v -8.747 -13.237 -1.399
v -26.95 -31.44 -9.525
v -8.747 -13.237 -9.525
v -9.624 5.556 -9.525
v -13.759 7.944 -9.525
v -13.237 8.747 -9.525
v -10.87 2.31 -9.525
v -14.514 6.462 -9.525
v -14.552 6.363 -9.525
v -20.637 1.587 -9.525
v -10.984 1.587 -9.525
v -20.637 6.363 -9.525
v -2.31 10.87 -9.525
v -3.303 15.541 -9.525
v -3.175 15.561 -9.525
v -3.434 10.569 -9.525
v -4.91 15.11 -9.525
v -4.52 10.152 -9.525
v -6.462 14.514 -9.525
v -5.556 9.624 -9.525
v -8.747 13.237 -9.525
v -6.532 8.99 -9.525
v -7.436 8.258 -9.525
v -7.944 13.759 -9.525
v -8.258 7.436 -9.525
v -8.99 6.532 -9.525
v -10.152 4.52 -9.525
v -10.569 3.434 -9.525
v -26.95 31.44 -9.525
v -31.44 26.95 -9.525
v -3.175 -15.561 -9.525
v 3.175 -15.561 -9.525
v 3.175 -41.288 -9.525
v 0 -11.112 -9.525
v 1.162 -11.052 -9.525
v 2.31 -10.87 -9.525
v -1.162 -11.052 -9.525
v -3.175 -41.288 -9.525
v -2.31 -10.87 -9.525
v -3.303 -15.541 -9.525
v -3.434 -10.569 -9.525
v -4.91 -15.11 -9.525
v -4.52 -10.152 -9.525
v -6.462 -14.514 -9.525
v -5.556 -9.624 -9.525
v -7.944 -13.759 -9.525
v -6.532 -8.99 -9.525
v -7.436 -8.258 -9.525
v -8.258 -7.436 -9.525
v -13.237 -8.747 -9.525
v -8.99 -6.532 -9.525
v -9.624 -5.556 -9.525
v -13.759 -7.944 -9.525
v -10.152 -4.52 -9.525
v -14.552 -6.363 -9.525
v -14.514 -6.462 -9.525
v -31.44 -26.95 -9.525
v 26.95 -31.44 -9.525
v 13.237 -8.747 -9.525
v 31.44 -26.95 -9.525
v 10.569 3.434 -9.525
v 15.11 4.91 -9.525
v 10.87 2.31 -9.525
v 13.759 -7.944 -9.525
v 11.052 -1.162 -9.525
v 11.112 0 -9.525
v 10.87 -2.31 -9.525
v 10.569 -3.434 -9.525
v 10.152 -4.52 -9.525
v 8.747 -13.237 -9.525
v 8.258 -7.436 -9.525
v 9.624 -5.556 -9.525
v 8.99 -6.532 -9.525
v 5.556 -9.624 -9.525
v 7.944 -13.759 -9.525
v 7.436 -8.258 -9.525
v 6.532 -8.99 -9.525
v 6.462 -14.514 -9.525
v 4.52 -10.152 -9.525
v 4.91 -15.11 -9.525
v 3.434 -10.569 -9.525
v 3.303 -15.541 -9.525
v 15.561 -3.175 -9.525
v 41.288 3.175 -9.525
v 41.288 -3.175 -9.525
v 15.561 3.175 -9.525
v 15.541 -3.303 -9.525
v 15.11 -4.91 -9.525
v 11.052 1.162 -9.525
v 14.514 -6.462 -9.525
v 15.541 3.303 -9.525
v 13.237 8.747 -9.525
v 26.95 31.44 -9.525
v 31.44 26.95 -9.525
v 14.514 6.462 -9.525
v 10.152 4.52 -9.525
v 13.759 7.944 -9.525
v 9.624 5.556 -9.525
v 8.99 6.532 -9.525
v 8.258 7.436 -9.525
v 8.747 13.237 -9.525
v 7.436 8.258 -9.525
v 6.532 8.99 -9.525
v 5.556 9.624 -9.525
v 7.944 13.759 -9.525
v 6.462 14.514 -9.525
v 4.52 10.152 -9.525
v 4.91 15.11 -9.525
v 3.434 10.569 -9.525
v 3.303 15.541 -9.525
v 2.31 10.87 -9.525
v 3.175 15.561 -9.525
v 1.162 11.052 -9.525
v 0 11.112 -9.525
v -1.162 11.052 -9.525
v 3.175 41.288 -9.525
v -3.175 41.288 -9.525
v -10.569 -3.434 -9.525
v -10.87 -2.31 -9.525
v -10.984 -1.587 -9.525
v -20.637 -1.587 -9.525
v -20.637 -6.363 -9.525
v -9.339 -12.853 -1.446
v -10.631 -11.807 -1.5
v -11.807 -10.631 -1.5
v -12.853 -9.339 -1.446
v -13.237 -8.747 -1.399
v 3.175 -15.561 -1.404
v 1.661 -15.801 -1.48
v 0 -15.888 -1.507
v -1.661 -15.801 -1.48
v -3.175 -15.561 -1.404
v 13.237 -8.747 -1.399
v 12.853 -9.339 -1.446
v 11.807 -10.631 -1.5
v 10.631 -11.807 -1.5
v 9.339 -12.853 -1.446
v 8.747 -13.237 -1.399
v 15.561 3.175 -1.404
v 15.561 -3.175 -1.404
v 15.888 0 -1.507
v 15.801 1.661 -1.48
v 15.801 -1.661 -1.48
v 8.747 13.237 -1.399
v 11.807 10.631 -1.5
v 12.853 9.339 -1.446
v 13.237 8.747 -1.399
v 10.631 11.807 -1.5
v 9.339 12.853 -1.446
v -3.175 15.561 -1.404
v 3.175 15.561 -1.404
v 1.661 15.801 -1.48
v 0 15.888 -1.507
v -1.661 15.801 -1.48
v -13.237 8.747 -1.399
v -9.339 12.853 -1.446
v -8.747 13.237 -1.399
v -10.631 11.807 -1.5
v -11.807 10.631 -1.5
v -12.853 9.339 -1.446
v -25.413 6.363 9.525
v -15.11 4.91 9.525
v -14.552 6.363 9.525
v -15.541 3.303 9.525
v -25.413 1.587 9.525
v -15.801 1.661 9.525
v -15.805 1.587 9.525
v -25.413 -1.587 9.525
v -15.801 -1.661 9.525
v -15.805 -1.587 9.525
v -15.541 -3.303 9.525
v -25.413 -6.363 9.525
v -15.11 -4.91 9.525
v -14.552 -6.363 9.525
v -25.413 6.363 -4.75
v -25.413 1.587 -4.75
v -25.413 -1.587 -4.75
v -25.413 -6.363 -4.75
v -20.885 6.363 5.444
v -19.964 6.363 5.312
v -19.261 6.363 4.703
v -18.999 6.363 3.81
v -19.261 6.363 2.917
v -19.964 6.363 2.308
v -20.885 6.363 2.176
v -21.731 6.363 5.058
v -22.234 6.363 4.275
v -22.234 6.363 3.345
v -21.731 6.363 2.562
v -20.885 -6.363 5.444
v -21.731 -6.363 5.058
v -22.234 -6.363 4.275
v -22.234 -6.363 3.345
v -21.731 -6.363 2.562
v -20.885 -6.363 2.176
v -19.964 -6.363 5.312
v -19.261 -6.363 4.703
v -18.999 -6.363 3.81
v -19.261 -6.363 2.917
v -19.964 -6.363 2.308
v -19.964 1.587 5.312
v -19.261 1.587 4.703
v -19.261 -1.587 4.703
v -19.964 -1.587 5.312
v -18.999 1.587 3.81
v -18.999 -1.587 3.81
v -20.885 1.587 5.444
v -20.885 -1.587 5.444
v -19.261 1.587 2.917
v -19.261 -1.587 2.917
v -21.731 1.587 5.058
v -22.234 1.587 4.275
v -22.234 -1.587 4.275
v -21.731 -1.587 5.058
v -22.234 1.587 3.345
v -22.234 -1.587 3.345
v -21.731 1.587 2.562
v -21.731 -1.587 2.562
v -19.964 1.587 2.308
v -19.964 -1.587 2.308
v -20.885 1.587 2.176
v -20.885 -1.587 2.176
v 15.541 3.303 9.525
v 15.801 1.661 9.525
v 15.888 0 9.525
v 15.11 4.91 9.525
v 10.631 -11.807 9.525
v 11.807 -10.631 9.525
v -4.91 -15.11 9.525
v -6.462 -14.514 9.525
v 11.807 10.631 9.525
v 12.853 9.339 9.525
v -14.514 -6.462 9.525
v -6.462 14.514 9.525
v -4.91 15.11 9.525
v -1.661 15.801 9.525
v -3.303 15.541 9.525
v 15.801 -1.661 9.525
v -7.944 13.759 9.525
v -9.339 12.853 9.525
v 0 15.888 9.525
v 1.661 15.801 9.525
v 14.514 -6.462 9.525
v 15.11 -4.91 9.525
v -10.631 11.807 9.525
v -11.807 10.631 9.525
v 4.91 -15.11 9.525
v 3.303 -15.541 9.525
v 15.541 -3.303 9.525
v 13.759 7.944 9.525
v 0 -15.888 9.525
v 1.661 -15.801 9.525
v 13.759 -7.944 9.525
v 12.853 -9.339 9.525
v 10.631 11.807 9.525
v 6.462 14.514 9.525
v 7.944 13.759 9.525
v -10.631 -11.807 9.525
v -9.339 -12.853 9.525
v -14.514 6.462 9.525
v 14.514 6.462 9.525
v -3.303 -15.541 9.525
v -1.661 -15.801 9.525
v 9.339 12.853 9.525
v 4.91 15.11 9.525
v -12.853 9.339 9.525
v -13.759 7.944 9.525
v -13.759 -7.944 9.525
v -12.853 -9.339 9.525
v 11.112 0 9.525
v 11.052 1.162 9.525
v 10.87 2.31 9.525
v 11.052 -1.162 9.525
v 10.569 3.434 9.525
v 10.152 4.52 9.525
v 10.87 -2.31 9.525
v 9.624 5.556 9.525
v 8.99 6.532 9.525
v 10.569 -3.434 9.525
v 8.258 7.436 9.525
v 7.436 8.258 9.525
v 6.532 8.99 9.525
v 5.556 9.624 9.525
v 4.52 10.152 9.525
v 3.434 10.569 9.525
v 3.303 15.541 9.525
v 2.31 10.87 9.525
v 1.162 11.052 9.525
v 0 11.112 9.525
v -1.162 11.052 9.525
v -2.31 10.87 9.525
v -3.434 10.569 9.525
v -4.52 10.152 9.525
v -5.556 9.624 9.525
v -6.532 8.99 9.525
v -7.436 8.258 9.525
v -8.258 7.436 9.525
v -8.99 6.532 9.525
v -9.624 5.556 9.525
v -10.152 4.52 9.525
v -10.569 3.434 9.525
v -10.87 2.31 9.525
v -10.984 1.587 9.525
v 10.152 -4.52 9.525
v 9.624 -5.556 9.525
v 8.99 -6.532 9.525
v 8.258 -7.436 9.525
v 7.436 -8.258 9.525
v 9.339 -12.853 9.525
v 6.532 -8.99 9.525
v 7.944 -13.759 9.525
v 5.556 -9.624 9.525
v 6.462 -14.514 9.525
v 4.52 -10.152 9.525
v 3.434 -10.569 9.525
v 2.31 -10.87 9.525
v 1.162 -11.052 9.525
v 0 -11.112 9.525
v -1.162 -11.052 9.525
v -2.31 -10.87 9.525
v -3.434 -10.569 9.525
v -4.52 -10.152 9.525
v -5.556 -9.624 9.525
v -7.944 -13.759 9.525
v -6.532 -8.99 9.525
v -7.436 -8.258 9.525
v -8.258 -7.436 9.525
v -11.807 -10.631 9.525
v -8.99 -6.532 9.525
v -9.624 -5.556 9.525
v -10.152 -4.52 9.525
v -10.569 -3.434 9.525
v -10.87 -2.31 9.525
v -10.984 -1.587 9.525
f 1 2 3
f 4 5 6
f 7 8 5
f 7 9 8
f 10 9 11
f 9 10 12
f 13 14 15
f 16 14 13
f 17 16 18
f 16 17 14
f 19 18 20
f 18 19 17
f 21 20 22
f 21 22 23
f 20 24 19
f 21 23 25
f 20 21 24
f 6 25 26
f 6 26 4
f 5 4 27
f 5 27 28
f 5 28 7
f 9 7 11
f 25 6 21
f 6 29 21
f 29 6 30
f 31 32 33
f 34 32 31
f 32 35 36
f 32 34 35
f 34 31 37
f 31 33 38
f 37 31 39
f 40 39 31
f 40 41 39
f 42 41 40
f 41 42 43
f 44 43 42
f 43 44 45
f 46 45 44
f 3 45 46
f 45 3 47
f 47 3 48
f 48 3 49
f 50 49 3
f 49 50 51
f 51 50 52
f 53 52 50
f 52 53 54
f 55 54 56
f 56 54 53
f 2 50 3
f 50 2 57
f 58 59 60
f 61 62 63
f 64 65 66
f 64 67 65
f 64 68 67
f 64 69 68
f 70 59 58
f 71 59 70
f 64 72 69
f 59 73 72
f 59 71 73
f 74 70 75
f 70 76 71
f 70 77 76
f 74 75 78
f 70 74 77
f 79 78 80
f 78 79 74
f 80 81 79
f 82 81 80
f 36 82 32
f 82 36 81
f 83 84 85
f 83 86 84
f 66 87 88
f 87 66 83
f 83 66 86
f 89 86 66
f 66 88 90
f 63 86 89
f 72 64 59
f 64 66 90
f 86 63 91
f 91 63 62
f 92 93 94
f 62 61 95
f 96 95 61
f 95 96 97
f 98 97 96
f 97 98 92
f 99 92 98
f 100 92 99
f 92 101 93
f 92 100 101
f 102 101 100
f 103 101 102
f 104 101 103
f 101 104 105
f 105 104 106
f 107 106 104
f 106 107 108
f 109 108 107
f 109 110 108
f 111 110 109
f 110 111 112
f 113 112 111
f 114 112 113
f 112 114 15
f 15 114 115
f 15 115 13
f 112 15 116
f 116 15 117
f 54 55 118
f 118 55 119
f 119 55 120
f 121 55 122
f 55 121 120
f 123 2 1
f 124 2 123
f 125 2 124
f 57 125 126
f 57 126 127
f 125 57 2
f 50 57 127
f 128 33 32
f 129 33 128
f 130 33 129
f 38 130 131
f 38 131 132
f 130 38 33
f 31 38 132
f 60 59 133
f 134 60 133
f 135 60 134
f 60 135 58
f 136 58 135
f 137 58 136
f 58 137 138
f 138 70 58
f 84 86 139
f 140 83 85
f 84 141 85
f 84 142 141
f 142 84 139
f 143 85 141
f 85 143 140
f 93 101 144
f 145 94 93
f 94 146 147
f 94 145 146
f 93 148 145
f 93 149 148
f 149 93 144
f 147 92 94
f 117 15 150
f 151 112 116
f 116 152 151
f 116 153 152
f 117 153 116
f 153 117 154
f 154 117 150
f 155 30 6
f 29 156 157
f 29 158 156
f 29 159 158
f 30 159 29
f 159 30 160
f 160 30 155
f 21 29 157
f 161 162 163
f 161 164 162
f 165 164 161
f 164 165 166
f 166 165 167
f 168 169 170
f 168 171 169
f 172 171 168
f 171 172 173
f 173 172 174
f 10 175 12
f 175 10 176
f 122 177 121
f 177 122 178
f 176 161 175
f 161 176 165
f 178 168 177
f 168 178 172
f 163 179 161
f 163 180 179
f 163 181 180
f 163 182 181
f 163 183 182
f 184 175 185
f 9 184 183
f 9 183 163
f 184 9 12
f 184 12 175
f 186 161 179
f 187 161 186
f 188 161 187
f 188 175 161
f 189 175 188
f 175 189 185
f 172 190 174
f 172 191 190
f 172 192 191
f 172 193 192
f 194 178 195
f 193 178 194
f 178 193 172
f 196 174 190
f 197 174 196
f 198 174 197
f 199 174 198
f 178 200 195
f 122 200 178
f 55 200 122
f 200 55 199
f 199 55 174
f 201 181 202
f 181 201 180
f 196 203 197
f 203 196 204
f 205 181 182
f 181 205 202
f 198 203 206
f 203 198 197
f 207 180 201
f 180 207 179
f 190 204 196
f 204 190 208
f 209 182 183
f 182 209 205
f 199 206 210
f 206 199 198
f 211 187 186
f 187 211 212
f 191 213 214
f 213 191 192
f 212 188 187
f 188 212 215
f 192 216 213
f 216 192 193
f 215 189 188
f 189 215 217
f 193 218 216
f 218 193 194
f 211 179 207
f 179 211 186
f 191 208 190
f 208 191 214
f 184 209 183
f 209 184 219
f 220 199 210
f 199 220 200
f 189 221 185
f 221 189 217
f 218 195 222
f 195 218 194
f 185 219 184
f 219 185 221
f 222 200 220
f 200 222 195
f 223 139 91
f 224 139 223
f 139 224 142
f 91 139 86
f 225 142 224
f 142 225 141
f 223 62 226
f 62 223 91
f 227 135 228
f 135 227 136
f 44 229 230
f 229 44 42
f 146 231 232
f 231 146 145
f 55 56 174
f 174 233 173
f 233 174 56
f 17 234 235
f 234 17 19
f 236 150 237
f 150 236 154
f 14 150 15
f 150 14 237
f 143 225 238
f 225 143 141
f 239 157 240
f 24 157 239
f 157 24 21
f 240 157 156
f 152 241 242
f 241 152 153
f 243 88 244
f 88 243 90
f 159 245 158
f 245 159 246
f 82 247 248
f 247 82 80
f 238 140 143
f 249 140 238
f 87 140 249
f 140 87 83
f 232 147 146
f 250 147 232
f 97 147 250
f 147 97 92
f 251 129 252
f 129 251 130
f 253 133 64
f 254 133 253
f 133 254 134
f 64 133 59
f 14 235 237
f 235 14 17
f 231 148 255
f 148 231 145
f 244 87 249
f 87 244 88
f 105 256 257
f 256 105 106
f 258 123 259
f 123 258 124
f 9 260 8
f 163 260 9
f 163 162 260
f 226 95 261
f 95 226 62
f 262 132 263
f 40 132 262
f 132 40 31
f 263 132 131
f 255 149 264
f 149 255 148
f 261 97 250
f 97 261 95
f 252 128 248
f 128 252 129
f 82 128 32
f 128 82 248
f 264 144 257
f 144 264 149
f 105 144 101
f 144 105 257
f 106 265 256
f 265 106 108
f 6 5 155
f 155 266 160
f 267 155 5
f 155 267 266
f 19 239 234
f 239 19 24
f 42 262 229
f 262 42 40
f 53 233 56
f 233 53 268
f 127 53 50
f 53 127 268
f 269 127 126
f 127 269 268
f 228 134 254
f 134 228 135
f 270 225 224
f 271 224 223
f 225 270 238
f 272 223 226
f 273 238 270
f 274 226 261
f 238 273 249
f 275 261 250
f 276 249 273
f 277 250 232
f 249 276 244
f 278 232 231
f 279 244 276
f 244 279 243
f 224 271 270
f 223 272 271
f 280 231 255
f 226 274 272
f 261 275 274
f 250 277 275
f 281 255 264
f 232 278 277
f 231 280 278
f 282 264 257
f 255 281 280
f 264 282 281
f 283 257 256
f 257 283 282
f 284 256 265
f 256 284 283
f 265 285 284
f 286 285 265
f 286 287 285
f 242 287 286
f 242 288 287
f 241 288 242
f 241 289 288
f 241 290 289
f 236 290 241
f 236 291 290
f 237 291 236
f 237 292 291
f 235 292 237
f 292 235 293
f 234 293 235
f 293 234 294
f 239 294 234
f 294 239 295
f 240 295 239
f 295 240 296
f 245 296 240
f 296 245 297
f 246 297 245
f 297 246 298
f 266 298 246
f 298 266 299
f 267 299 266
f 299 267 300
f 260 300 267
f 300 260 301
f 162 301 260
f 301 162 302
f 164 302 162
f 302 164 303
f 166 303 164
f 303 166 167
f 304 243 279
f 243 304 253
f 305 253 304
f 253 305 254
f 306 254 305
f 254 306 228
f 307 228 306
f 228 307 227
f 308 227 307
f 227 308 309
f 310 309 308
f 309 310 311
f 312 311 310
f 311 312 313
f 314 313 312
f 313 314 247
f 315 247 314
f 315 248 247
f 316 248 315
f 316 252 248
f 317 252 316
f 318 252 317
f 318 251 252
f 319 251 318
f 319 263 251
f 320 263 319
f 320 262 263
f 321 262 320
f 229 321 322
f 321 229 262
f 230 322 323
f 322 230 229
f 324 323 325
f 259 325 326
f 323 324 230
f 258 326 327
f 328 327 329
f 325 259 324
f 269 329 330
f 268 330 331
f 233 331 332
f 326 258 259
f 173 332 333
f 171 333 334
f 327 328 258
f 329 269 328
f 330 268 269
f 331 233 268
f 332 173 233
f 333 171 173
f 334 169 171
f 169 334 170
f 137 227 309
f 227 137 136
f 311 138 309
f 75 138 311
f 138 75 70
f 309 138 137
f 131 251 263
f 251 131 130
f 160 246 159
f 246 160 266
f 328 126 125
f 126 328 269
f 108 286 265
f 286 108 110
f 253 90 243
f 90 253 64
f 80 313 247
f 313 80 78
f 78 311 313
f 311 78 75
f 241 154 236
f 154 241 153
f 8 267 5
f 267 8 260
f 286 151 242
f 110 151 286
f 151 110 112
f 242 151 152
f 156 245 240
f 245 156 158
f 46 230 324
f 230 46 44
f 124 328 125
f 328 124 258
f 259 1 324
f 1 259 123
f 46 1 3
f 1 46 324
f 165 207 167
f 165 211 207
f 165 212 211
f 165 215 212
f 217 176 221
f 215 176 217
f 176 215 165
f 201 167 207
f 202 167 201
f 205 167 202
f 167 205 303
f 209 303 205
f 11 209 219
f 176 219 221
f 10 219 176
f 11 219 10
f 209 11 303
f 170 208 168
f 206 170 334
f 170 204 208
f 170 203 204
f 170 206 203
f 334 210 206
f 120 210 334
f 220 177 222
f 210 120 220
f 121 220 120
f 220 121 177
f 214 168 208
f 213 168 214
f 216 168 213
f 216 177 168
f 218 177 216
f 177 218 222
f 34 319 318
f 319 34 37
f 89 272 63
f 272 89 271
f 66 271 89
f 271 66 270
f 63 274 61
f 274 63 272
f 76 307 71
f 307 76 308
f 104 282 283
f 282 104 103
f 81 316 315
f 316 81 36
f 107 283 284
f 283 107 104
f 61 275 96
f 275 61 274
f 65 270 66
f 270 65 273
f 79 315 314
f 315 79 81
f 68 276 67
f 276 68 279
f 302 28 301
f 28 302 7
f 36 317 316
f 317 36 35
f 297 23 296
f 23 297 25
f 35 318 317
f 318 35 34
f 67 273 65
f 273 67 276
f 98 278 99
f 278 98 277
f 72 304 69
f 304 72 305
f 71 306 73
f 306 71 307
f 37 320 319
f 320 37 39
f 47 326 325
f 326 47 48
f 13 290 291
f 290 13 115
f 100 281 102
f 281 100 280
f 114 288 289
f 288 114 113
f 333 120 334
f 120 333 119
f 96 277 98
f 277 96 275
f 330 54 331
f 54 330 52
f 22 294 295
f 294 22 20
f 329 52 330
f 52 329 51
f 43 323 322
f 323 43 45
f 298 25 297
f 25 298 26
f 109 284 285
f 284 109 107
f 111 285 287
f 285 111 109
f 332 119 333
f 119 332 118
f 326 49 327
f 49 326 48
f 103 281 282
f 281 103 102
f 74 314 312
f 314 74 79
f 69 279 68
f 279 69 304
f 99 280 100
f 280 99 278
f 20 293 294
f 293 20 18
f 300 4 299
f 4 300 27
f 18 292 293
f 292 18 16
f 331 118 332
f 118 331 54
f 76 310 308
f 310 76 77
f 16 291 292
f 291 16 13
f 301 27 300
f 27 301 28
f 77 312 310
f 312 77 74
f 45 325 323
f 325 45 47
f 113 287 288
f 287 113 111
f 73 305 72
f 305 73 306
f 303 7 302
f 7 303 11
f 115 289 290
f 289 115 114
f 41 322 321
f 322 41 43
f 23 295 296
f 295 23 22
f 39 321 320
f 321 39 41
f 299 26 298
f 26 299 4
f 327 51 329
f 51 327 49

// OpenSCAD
// Wheelchair Handle Deterrent
// Version 1.0
// Fully parameterized model for wheelchair handle spikes.
// You attach this to the handles of a wheelchair to prevent people from grabbing them without consent/permission.

// Wheelchair Handle Deterrent © 2024-04-29 by Joe Shields is licensed under CC BY-SA 4.0. 
// To view a copy of this license, visit https://creativecommons.org/licenses/by-sa/4.0/
// This means you can distribute, remix, adapt, and build upon the material in any medium or format, 
// even for commercial purposes, provided the following conditions:
// You must provide attribution to the creator(s).
// You must license any derivative works under this same license.

/*[technical stuff]*/
// factor for unit conversion
scaleFactor=25.4; // [25.4:input inches and output mm (RECOMMENDED), 2.54:input inches and output cm, 1:input units same as output units, 0.39370078740157480315:input cm output inches, 0.03937007874015748031:input mm output inches (NOT RECOMMENDED)]
// minimum facet angle for circles (not influenced by scaleFactor). Lower this to eliminate the "lowpoly" appearance of the ring.
$fa=6; // [1:12]
// minimum facet size for circles (not influenced by scaleFactor). Lower this to eliminate the "lowpoly" appearance of the ring.
$fs=1; // [0.1:0.1:2]

/*[ring]*/
// inner diameter of the ring. Make this a little smaller (about 0.04 inches) than the OD of the handle for a friction fit.
ringID_input=0.875; // .001
ringID=ringID_input*scaleFactor;

// wall thickness of the ring
ringThickness_input=0.188; // .001
ringThickness=ringThickness_input*scaleFactor;
ringOD=ringID+ringThickness*2;

// how much space the ring will occupy on the handle
ringWidth_input=0.75; // .001
ringWidth=ringWidth_input*scaleFactor;

/*[spikes]*/
// width of the spikes (circumferential direction). Increase this for stronger, blunter spikes.
spikeWidth_input=0.25; // .001
spikeWidth=spikeWidth_input*scaleFactor;

// how far the spikes stick out from the ring
spikeLength_input=1; // .001
spikeLength=spikeLength_input*scaleFactor;

// height of the spikes (axial direction). This should be less than the ring width. Increase this for stronger, blunter spikes.
spikeHeight_input=0.375; // .001
spikeHeight=spikeHeight_input*scaleFactor;

// number of spikes. If you increase this high enough, you'll get a disk. If you do this, it's recommended you opt for the bolt tab and do not undersize ringID.
nSpikes=7; // [1:36]

// circumferential position where the spikes start. This must be less than spikeAngleEnd.
spikeAngleStart=-45; // [-90:270]
// circumferential positoin where the spikes end. This must be greater than spikeAngleStart.
spikeAngleEnd=225; // [-90:270]
spikeRange=[spikeAngleStart,spikeAngleEnd];
spikeStep=(spikeRange[1]-spikeRange[0])/(nSpikes-1);

/*[bolt tab]*/
// This adds a tab with a hole, allowing you to tighten the ring with a screw and nut. The length of bolt/screw should be at least 2*tabThickness+slitSize plus the thickness of the nut and any washers you use. (You should use washers.)
hasTab=true;

// how far the tab sticks out from the ring.
tabLength_input=0.375; // .001
tabLength=tabLength_input*scaleFactor; // [0, ringWidth/2]

// wall thickness of the tab. This should be at least as large as ringThickness.
tabThickness_input=0.188; // .001
tabThickness=tabThickness_input*scaleFactor;

// size of the slit in the ring. Making this larger (and possibly also increasing tabLength) can help the ring grip better.
slitSize_input=0.125; // .001
slitSize=slitSize_input*scaleFactor;
slitLength=(ringID/2+ringThickness+tabLength+spikeLength)*1.1;

// size of the hole for the bolt/screw. 0.13 inches is sufficient for #4 or M3 screws. Search online for "clearance hole chart" if you want to size this for a different fastener.
boltHoleID_input=0.13; // .001
boltHoleID=boltHoleID_input*scaleFactor;

// how far along the tab (radial direction) the hole is from the ring
holePositionFactorR=0.5; // [0:0.1:1]
holePositionR=tabLength*holePositionFactorR;

// how far along the tab (axial direction) the hole is from the chamfered corner of the tab
holePositionFactorZ=0.7; // [0:0.1:1]
holePositionZ=ringWidth*holePositionFactorZ;
jointWidth=tabThickness*2+slitSize;


module spikeArray(){
    color("red", alpha = 0.5)
    union(){
    for (angle=[spikeRange[0]:spikeStep:spikeRange[1]])
    {
        rotate([0,0,angle])
            translate([0,-ringID/2,-ringWidth/2])
                rotate([90,0,-90])
                    linear_extrude(spikeWidth, center=true)
                        polygon(points=[ [0,0], [spikeLength+ringThickness,0], [0,spikeHeight] ]);
    }
    }
}

module tab() // adds the bolt tab
{
    difference()
    {
        // body of the tab
        translate([-ringID/2,0,0])
            rotate([90,0,180])
                translate([0,-ringWidth/2,-(jointWidth)/2])
                    linear_extrude(jointWidth)
                        polygon(points=[[0,0], [0,ringWidth], [tabLength+ringThickness,ringWidth], [tabLength+ringThickness, tabThickness], [tabLength+ringThickness-tabThickness,0]]);
        // bolt hole
        translate([-(ringOD/2+holePositionR),0,-(ringWidth/2-holePositionZ)])
            rotate([90,0,0])
                cylinder(h=jointWidth*1.1, r=boltHoleID/2, center=true);
    }
}

color("blue", alpha = 0.5)
difference(){
    union(){
        cylinder(h=ringWidth, r=ringID/2+ringThickness, center=true);
        spikeArray();
        if (hasTab) tab();
    }
    translate([-slitLength/2,0,0])
        cube([slitLength,slitSize,ringWidth*1.1], center=true);
    cylinder(h=ringWidth+1, r=ringID/2, center=true);

}
